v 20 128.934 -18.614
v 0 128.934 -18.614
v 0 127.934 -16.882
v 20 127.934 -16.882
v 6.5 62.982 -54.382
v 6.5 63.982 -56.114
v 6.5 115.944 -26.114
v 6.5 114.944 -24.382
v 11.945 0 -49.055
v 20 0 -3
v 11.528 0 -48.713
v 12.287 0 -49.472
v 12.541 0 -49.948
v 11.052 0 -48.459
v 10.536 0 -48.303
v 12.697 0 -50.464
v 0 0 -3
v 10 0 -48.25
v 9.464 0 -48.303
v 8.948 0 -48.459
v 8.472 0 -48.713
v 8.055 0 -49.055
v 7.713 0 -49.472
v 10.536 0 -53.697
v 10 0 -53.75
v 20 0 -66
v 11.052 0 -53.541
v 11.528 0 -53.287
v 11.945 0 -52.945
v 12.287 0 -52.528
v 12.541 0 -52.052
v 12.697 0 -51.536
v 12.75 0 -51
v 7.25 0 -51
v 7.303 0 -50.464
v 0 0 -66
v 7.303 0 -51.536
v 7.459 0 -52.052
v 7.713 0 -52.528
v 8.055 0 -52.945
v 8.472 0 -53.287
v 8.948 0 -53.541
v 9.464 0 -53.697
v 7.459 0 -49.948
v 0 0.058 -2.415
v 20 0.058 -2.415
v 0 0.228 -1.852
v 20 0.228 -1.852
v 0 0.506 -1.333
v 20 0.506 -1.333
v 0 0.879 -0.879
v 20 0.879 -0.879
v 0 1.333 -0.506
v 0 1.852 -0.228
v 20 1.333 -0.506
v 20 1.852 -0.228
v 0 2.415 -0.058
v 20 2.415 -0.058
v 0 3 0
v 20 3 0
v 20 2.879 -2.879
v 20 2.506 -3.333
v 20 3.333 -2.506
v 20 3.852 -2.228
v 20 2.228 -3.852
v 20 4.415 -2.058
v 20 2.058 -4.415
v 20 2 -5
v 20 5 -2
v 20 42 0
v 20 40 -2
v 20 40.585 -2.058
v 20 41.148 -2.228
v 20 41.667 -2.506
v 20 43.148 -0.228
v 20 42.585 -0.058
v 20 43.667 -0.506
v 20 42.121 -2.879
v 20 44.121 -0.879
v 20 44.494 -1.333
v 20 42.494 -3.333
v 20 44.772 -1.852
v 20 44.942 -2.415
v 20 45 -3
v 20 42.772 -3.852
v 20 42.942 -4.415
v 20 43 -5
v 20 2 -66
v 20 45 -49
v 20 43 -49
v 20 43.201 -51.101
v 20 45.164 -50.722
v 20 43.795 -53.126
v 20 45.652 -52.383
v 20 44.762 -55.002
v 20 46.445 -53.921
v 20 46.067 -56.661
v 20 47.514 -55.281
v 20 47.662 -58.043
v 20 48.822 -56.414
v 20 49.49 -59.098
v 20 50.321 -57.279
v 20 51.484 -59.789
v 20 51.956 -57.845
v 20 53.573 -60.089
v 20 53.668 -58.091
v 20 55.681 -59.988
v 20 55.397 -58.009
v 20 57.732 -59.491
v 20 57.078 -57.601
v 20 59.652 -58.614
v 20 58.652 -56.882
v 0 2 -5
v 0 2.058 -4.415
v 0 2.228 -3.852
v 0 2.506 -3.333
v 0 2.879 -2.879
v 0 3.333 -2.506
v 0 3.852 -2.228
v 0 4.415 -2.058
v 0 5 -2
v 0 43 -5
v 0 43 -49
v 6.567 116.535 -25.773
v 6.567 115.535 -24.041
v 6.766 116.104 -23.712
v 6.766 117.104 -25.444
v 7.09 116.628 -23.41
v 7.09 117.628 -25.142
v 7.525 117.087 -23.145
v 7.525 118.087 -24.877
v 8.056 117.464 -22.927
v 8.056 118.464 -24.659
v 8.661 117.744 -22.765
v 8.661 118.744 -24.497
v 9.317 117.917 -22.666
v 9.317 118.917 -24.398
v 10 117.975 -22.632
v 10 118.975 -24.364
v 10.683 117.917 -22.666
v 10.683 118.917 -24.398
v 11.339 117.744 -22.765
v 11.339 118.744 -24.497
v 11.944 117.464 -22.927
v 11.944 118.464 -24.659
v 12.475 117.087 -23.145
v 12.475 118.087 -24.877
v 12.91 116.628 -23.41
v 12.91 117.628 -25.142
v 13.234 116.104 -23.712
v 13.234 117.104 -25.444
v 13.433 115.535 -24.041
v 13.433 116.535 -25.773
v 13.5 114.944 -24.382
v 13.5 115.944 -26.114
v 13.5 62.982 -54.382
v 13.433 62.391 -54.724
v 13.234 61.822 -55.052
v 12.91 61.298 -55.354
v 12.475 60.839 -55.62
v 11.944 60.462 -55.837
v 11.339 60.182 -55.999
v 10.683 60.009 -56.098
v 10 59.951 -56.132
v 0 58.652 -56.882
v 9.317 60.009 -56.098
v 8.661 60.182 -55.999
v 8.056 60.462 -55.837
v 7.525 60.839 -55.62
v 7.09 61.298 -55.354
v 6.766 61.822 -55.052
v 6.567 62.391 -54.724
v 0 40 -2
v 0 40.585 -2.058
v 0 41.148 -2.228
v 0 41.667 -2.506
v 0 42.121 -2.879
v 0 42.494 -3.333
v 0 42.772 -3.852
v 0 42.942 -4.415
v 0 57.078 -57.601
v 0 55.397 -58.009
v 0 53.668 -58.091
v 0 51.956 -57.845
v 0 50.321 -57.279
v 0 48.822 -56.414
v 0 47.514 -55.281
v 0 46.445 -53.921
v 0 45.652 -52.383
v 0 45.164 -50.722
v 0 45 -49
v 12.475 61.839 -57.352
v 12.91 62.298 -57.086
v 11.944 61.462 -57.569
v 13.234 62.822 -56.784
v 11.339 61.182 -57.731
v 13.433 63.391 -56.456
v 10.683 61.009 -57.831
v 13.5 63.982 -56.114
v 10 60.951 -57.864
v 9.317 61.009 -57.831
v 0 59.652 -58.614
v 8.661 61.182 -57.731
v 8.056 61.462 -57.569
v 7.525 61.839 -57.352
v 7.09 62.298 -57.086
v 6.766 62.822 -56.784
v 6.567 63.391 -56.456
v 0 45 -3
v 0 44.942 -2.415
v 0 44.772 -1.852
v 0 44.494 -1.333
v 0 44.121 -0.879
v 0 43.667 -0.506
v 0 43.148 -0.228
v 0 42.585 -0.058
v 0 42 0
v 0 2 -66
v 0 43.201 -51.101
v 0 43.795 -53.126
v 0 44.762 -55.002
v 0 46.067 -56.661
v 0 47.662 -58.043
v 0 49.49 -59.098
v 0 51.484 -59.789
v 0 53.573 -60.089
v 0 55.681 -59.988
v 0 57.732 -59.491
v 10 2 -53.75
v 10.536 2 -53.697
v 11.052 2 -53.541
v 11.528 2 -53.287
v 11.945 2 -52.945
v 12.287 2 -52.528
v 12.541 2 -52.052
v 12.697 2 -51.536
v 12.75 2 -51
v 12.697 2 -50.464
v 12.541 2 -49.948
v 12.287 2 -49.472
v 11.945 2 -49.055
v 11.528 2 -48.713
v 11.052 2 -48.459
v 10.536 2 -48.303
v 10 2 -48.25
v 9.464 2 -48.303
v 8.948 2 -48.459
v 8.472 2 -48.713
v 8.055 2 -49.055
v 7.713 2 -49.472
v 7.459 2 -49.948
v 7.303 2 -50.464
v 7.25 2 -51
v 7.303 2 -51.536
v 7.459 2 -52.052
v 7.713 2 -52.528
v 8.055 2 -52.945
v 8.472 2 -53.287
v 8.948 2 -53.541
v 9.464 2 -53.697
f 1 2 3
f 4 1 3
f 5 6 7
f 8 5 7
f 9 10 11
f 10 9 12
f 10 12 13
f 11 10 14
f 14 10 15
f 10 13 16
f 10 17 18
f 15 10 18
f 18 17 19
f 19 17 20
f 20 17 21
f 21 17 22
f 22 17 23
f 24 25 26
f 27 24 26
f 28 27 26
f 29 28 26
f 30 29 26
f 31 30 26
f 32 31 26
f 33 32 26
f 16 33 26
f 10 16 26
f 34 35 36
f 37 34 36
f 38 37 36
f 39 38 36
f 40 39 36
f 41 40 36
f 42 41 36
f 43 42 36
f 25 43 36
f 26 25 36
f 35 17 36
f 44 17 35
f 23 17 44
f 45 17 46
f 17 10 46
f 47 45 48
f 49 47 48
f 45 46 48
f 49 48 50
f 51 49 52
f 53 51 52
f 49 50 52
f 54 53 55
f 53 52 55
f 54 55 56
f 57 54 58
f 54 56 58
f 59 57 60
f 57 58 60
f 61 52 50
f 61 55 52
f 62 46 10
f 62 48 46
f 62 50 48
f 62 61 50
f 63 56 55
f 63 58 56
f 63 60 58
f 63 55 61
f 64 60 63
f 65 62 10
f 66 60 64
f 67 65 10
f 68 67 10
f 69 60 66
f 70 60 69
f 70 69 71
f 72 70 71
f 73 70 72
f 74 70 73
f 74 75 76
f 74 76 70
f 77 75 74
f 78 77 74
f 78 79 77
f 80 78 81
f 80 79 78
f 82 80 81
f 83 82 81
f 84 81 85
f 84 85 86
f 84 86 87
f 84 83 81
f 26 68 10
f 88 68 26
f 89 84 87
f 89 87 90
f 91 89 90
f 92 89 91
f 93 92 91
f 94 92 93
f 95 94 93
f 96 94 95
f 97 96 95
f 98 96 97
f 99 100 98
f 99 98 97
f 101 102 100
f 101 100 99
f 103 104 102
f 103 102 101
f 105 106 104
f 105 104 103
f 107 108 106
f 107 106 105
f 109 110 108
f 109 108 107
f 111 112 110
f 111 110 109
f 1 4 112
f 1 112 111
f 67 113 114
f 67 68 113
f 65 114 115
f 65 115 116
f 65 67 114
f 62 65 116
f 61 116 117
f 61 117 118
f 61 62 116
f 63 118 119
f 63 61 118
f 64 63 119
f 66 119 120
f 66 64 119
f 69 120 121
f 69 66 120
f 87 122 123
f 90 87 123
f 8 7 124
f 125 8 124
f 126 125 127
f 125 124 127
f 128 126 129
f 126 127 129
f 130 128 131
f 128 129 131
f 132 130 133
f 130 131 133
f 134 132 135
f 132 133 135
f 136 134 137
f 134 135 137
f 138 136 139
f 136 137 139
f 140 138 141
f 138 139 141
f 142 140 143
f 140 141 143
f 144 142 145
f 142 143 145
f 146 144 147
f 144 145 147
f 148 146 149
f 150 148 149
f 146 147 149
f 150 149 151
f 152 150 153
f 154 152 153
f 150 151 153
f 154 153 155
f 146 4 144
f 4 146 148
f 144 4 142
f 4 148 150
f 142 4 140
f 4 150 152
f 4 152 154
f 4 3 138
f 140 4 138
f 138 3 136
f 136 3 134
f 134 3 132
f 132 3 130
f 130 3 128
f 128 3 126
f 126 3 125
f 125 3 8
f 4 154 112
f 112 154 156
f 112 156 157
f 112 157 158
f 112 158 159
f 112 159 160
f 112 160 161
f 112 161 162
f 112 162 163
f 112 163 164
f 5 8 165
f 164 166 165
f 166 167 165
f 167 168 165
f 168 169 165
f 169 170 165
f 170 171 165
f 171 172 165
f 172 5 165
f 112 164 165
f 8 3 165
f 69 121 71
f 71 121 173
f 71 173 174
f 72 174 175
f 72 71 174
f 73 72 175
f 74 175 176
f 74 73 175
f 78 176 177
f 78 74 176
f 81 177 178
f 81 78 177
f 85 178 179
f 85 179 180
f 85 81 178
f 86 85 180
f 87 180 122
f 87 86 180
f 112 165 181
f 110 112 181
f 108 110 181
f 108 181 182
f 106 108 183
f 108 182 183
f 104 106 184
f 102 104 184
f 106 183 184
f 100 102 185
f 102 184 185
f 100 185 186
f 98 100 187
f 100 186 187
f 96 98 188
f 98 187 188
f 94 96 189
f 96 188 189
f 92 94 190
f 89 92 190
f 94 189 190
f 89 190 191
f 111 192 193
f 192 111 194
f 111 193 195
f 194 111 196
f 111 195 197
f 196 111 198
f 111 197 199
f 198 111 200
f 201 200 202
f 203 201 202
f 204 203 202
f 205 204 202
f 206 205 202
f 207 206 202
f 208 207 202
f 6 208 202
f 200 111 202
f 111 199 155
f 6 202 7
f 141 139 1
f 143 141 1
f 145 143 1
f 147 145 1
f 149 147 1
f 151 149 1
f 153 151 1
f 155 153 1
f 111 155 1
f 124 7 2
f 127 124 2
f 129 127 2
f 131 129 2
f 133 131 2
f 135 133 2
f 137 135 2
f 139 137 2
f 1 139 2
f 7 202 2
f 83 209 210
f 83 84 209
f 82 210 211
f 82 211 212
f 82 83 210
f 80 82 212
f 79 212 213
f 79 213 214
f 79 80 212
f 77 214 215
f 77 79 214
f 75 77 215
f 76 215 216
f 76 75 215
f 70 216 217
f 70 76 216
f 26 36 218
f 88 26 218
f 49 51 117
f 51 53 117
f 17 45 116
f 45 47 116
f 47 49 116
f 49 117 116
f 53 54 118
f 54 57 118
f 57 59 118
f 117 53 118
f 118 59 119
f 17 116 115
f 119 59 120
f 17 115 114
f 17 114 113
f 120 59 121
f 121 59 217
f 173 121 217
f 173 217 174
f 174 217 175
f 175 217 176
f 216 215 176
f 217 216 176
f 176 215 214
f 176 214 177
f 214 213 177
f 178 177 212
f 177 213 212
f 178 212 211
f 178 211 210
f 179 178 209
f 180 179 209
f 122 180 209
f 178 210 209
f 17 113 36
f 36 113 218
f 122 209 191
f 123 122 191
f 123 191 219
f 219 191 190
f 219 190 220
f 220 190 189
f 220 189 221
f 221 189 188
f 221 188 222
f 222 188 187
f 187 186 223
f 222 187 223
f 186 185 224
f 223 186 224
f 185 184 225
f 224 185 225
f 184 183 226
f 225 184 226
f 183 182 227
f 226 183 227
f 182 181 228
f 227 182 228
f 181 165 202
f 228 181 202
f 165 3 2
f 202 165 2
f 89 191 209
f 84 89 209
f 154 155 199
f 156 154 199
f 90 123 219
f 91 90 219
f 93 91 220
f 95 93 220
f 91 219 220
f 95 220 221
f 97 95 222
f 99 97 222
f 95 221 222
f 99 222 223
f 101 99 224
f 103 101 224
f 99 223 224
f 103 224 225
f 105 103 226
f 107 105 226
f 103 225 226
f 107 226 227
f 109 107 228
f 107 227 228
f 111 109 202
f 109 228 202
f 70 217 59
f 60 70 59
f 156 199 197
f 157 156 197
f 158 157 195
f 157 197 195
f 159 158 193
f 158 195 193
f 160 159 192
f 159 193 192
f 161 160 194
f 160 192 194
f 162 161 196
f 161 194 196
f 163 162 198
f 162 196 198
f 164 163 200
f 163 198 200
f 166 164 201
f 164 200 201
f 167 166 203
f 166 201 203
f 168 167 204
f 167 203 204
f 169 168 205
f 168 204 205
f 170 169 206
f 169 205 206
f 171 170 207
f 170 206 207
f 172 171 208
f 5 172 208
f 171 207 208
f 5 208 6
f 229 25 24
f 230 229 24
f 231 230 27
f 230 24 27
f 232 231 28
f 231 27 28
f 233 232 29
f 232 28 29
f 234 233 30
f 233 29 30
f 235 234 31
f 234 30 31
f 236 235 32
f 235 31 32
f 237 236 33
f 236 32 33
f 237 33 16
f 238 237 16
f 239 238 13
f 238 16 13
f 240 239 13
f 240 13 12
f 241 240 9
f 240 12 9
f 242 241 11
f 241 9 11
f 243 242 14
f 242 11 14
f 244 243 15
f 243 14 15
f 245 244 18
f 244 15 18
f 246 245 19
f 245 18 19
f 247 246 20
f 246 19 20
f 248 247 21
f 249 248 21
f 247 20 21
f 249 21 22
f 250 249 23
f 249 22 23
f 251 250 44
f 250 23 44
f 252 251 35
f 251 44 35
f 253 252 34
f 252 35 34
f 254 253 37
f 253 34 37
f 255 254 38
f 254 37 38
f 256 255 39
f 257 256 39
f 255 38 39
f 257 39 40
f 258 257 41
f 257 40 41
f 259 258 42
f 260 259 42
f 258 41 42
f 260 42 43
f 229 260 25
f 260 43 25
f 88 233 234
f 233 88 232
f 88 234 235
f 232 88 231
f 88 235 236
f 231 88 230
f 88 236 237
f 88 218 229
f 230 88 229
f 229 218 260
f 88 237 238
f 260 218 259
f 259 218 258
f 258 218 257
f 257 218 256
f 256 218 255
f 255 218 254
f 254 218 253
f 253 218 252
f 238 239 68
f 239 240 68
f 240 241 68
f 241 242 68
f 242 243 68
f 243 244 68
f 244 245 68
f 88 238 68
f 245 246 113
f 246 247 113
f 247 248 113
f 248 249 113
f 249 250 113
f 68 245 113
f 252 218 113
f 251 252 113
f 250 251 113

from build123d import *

# Parameters (mm, degrees)
RESSALTO_EXTRUS_O4_DEPTH = 20
FILETE1_R                = 3
ESBO_O5_R                = 2.75
CORTE_EXTRUS_O1_DEPTH    = 2
CORTE_EXTRUS_O2_DEPTH    = 2


with BuildPart() as part:
    # Esboço4 → Ressalto-extrusão4 (new body)
    with BuildSketch(Plane(origin=(0, 0, 0), x_dir=(0, 0, -1), z_dir=(1, 0, 0))):
        with BuildLine():
            Line((0, 0), (66, 0))
            Line((66, 0), (66, 2))
            Line((66, 2), (2, 2))
            Line((2, 2), (2, 43))
            Line((2, 43), (49, 43))
            ThreePointArc((49, 43), (58.614151216, 48.550732793), (58.614151216, 59.652198378))
            Line((58.614151216, 59.652198378), (18.614151216, 128.93423068))
            Line((18.614151216, 128.93423068), (16.882100408, 127.93423068))
            Line((16.882100408, 127.93423068), (56.882100408, 58.652198378))
            ThreePointArc((56.882100408, 58.652198378), (56.882100408, 49.550732793), (49, 45))
            Line((49, 45), (0, 45))
            Line((0, 45), (0, 0))
        make_face()
    extrude(amount=RESSALTO_EXTRUS_O4_DEPTH)

    # Filete1
    filete1_edges = [part.edges().sort_by_distance(p)[0] for p in [
        (10, 45, 0),
        (10, 43, -2),
        (10, 2, -2),
        (10, 0, 0),
    ]]
    fillet(filete1_edges, radius=FILETE1_R)

    # Esboço5 → Corte-extrusão1 (cut)
    with BuildSketch(Plane.XZ):
        with Locations(Location((10, -51, 0), (0, 0, 270))):
            Circle(ESBO_O5_R)
    extrude(amount=-CORTE_EXTRUS_O1_DEPTH, mode=Mode.SUBTRACT)

    # Esboço6 → Corte-extrusão2 (cut)
    with BuildSketch(Plane(origin=(0, 40.293721582, -69.790773005), x_dir=(-1, 0, 0), z_dir=(0, 0.4999999999999983, -0.8660254037844398))):
        with BuildLine():
            Line((-13.5, 87.353243579), (-13.5, 27.353243579))
            ThreePointArc((-13.5, 27.353243579), (-10, 23.853243579), (-6.5, 27.353243579))
            Line((-6.5, 27.353243579), (-6.5, 87.353243579))
            ThreePointArc((-6.5, 87.353243579), (-10, 90.853243579), (-13.5, 87.353243579))
        make_face()
    extrude(amount=-CORTE_EXTRUS_O2_DEPTH, mode=Mode.SUBTRACT)


solid = part.part
